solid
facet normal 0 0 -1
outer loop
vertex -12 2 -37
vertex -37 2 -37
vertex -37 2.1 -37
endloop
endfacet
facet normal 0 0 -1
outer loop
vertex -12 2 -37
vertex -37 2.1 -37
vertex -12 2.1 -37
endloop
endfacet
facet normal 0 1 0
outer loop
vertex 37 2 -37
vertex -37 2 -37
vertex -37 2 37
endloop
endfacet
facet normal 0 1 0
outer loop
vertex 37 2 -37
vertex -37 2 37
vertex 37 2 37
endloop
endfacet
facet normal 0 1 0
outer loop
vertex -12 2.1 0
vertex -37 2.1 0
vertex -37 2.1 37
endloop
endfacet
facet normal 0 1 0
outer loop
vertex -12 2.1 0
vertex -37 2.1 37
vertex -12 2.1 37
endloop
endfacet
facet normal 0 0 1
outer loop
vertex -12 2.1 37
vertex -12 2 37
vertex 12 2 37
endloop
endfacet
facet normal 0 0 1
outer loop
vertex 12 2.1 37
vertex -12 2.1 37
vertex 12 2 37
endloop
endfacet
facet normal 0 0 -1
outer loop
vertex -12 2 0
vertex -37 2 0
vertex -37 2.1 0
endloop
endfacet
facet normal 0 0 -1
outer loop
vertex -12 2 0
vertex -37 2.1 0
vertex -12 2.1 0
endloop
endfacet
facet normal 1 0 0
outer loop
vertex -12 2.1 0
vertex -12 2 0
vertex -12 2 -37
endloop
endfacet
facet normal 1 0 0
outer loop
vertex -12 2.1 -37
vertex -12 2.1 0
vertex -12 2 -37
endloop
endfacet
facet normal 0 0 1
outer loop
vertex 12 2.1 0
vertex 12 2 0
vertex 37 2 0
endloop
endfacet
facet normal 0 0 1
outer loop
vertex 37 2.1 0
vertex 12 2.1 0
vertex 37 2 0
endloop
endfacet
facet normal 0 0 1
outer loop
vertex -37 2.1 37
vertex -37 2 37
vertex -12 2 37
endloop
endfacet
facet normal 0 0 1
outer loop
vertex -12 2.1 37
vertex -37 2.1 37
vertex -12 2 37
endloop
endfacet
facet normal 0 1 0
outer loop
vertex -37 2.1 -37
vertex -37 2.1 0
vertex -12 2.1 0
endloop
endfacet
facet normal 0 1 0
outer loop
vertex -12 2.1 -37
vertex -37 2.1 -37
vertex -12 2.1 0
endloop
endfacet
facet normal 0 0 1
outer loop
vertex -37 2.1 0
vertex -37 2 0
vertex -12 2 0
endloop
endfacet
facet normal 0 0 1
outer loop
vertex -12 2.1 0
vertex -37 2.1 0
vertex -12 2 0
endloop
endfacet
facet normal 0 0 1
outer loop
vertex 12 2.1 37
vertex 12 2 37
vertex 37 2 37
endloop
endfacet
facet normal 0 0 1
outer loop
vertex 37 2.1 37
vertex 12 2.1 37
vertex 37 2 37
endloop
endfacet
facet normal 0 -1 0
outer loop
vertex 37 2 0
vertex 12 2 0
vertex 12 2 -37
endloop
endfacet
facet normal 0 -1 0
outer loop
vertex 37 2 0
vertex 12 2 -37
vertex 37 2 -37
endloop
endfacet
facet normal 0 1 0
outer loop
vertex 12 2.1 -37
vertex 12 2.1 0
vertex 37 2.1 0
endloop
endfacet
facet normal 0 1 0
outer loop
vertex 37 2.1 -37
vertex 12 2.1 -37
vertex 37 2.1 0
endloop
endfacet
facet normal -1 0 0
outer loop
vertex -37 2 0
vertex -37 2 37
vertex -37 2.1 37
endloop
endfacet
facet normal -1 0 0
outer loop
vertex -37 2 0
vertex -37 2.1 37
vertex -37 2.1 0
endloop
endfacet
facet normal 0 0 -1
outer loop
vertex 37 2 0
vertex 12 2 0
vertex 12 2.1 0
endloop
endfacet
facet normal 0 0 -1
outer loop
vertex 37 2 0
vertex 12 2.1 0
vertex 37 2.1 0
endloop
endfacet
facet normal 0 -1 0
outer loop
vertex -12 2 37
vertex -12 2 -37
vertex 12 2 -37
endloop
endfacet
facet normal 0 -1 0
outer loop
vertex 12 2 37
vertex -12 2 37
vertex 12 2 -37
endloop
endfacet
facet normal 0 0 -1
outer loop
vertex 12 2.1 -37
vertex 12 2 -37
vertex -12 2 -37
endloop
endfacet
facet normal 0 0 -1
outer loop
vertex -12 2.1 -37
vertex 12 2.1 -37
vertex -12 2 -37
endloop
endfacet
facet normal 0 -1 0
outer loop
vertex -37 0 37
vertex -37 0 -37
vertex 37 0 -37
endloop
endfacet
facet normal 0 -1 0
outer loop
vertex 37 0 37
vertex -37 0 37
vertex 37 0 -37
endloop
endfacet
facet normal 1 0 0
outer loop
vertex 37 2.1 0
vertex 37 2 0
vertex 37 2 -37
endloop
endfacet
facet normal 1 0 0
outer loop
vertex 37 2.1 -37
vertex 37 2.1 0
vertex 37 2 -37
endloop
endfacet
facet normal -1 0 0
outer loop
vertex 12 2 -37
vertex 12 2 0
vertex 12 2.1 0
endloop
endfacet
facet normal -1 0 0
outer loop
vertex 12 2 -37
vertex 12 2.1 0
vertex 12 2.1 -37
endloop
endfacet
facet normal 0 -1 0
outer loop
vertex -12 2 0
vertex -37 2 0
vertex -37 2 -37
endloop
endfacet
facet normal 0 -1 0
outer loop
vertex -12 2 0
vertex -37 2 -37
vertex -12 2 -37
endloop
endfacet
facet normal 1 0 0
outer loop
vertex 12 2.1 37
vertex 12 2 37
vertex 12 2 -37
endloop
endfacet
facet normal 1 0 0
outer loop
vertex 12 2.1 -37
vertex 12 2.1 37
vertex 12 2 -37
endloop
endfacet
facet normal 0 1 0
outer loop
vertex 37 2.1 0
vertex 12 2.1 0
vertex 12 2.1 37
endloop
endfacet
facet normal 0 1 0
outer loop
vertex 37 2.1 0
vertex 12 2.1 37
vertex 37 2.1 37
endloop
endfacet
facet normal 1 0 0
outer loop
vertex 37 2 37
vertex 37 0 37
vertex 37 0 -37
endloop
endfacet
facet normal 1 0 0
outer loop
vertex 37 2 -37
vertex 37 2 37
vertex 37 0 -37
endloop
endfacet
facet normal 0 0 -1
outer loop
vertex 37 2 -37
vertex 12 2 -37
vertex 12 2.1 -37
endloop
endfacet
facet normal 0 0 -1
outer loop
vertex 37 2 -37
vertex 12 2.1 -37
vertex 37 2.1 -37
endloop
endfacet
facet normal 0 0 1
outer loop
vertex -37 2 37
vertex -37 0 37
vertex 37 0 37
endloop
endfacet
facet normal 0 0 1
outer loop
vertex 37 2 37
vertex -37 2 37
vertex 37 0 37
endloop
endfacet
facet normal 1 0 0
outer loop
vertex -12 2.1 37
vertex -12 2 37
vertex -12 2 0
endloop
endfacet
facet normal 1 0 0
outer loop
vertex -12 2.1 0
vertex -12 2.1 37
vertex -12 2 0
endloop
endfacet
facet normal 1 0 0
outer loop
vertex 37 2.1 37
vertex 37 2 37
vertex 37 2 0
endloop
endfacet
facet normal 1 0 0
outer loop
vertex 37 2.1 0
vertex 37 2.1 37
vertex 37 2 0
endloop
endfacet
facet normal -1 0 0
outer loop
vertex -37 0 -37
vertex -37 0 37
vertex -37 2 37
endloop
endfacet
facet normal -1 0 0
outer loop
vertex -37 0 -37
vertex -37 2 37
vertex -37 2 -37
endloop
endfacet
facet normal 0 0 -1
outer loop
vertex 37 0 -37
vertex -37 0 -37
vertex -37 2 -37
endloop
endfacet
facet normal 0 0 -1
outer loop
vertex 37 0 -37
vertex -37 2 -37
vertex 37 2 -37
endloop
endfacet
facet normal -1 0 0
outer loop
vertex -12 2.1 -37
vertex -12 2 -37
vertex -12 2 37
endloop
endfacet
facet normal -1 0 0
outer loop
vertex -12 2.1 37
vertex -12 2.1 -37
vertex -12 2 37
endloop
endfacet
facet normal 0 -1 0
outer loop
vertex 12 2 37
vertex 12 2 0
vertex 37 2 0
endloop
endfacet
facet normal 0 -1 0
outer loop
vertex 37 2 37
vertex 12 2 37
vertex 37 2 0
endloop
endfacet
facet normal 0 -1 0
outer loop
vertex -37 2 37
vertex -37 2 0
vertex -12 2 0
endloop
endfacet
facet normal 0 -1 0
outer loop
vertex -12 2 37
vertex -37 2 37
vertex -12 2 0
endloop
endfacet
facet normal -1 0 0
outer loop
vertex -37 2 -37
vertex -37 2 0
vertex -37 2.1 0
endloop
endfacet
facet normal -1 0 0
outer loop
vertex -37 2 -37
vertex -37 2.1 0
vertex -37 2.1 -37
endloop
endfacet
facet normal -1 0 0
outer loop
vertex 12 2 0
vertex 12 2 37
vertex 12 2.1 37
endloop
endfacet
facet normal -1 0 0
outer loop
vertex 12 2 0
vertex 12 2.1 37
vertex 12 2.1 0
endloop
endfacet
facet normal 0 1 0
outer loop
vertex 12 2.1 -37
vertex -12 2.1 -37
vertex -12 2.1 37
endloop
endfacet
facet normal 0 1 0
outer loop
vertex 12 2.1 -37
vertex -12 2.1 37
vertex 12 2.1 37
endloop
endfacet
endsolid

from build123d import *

# Parameters (mm, degrees)
SKETCH1_W           = 74
SKETCH1_H           = 74
BOSS_EXTRUDE1_DEPTH = 2
SKETCH2_W           = 25
SKETCH2_H           = 37
BOSS_EXTRUDE2_DEPTH = 0.1
SKETCH2_3_W         = 25
SKETCH2_3_H         = 37
BOSS_EXTRUDE3_DEPTH = 0.1
SKETCH2_4_W         = 25
SKETCH2_4_H         = 37
BOSS_EXTRUDE4_DEPTH = 0.1
BOSS_EXTRUDE5_DEPTH = 0.1
SKETCH2_6_W         = 25
SKETCH2_6_H         = 37
BOSS_EXTRUDE6_DEPTH = 0.1


with BuildPart() as part:
    # Sketch1 → Boss-Extrude1 (new body)
    with BuildSketch(Plane(origin=(0, 0, 0), x_dir=(1, 0, 0), z_dir=(0, 1, 0))):
        Rectangle(SKETCH1_W, SKETCH1_H)
    extrude(amount=BOSS_EXTRUDE1_DEPTH)


with BuildPart() as body_2:
    # Sketch2 → Boss-Extrude2 (new body)
    with BuildSketch(Plane(origin=(0, 2, 0), x_dir=(1, 0, 0), z_dir=(0, 1, 0))):
        with Locations((-24.5, 18.5)):
            Rectangle(SKETCH2_W, SKETCH2_H)
    extrude(amount=BOSS_EXTRUDE2_DEPTH)


with BuildPart() as body_3:
    # Sketch2<3> → Boss-Extrude3 (new body)
    with BuildSketch(Plane(origin=(0, 2, 0), x_dir=(1, 0, 0), z_dir=(0, 1, 0))):
        with Locations((24.5, -18.5)):
            Rectangle(SKETCH2_3_W, SKETCH2_3_H)
    extrude(amount=BOSS_EXTRUDE3_DEPTH)


with BuildPart() as body_4:
    # Sketch2<4> → Boss-Extrude4 (new body)
    with BuildSketch(Plane(origin=(0, 2, 0), x_dir=(1, 0, 0), z_dir=(0, 1, 0))):
        with Locations((-24.5, -18.5)):
            Rectangle(SKETCH2_4_W, SKETCH2_4_H)
    extrude(amount=BOSS_EXTRUDE4_DEPTH)


with BuildPart() as body_5:
    # Sketch2<5> → Boss-Extrude5 (new body)
    with BuildSketch(Plane(origin=(0, 2, 0), x_dir=(1, 0, 0), z_dir=(0, 1, 0))):
        Polygon((12, 37), (-12, 37), (-12, 0), (-12, -37), (12, -37), (12, 0), align=None)
    extrude(amount=BOSS_EXTRUDE5_DEPTH)


with BuildPart() as body_6:
    # Sketch2<6> → Boss-Extrude6 (new body)
    with BuildSketch(Plane(origin=(0, 2, 0), x_dir=(1, 0, 0), z_dir=(0, 1, 0))):
        with Locations((24.5, 18.5)):
            Rectangle(SKETCH2_6_W, SKETCH2_6_H)
    extrude(amount=BOSS_EXTRUDE6_DEPTH)


solid = Compound([part.part, body_2.part, body_3.part, body_4.part, body_5.part, body_6.part])
